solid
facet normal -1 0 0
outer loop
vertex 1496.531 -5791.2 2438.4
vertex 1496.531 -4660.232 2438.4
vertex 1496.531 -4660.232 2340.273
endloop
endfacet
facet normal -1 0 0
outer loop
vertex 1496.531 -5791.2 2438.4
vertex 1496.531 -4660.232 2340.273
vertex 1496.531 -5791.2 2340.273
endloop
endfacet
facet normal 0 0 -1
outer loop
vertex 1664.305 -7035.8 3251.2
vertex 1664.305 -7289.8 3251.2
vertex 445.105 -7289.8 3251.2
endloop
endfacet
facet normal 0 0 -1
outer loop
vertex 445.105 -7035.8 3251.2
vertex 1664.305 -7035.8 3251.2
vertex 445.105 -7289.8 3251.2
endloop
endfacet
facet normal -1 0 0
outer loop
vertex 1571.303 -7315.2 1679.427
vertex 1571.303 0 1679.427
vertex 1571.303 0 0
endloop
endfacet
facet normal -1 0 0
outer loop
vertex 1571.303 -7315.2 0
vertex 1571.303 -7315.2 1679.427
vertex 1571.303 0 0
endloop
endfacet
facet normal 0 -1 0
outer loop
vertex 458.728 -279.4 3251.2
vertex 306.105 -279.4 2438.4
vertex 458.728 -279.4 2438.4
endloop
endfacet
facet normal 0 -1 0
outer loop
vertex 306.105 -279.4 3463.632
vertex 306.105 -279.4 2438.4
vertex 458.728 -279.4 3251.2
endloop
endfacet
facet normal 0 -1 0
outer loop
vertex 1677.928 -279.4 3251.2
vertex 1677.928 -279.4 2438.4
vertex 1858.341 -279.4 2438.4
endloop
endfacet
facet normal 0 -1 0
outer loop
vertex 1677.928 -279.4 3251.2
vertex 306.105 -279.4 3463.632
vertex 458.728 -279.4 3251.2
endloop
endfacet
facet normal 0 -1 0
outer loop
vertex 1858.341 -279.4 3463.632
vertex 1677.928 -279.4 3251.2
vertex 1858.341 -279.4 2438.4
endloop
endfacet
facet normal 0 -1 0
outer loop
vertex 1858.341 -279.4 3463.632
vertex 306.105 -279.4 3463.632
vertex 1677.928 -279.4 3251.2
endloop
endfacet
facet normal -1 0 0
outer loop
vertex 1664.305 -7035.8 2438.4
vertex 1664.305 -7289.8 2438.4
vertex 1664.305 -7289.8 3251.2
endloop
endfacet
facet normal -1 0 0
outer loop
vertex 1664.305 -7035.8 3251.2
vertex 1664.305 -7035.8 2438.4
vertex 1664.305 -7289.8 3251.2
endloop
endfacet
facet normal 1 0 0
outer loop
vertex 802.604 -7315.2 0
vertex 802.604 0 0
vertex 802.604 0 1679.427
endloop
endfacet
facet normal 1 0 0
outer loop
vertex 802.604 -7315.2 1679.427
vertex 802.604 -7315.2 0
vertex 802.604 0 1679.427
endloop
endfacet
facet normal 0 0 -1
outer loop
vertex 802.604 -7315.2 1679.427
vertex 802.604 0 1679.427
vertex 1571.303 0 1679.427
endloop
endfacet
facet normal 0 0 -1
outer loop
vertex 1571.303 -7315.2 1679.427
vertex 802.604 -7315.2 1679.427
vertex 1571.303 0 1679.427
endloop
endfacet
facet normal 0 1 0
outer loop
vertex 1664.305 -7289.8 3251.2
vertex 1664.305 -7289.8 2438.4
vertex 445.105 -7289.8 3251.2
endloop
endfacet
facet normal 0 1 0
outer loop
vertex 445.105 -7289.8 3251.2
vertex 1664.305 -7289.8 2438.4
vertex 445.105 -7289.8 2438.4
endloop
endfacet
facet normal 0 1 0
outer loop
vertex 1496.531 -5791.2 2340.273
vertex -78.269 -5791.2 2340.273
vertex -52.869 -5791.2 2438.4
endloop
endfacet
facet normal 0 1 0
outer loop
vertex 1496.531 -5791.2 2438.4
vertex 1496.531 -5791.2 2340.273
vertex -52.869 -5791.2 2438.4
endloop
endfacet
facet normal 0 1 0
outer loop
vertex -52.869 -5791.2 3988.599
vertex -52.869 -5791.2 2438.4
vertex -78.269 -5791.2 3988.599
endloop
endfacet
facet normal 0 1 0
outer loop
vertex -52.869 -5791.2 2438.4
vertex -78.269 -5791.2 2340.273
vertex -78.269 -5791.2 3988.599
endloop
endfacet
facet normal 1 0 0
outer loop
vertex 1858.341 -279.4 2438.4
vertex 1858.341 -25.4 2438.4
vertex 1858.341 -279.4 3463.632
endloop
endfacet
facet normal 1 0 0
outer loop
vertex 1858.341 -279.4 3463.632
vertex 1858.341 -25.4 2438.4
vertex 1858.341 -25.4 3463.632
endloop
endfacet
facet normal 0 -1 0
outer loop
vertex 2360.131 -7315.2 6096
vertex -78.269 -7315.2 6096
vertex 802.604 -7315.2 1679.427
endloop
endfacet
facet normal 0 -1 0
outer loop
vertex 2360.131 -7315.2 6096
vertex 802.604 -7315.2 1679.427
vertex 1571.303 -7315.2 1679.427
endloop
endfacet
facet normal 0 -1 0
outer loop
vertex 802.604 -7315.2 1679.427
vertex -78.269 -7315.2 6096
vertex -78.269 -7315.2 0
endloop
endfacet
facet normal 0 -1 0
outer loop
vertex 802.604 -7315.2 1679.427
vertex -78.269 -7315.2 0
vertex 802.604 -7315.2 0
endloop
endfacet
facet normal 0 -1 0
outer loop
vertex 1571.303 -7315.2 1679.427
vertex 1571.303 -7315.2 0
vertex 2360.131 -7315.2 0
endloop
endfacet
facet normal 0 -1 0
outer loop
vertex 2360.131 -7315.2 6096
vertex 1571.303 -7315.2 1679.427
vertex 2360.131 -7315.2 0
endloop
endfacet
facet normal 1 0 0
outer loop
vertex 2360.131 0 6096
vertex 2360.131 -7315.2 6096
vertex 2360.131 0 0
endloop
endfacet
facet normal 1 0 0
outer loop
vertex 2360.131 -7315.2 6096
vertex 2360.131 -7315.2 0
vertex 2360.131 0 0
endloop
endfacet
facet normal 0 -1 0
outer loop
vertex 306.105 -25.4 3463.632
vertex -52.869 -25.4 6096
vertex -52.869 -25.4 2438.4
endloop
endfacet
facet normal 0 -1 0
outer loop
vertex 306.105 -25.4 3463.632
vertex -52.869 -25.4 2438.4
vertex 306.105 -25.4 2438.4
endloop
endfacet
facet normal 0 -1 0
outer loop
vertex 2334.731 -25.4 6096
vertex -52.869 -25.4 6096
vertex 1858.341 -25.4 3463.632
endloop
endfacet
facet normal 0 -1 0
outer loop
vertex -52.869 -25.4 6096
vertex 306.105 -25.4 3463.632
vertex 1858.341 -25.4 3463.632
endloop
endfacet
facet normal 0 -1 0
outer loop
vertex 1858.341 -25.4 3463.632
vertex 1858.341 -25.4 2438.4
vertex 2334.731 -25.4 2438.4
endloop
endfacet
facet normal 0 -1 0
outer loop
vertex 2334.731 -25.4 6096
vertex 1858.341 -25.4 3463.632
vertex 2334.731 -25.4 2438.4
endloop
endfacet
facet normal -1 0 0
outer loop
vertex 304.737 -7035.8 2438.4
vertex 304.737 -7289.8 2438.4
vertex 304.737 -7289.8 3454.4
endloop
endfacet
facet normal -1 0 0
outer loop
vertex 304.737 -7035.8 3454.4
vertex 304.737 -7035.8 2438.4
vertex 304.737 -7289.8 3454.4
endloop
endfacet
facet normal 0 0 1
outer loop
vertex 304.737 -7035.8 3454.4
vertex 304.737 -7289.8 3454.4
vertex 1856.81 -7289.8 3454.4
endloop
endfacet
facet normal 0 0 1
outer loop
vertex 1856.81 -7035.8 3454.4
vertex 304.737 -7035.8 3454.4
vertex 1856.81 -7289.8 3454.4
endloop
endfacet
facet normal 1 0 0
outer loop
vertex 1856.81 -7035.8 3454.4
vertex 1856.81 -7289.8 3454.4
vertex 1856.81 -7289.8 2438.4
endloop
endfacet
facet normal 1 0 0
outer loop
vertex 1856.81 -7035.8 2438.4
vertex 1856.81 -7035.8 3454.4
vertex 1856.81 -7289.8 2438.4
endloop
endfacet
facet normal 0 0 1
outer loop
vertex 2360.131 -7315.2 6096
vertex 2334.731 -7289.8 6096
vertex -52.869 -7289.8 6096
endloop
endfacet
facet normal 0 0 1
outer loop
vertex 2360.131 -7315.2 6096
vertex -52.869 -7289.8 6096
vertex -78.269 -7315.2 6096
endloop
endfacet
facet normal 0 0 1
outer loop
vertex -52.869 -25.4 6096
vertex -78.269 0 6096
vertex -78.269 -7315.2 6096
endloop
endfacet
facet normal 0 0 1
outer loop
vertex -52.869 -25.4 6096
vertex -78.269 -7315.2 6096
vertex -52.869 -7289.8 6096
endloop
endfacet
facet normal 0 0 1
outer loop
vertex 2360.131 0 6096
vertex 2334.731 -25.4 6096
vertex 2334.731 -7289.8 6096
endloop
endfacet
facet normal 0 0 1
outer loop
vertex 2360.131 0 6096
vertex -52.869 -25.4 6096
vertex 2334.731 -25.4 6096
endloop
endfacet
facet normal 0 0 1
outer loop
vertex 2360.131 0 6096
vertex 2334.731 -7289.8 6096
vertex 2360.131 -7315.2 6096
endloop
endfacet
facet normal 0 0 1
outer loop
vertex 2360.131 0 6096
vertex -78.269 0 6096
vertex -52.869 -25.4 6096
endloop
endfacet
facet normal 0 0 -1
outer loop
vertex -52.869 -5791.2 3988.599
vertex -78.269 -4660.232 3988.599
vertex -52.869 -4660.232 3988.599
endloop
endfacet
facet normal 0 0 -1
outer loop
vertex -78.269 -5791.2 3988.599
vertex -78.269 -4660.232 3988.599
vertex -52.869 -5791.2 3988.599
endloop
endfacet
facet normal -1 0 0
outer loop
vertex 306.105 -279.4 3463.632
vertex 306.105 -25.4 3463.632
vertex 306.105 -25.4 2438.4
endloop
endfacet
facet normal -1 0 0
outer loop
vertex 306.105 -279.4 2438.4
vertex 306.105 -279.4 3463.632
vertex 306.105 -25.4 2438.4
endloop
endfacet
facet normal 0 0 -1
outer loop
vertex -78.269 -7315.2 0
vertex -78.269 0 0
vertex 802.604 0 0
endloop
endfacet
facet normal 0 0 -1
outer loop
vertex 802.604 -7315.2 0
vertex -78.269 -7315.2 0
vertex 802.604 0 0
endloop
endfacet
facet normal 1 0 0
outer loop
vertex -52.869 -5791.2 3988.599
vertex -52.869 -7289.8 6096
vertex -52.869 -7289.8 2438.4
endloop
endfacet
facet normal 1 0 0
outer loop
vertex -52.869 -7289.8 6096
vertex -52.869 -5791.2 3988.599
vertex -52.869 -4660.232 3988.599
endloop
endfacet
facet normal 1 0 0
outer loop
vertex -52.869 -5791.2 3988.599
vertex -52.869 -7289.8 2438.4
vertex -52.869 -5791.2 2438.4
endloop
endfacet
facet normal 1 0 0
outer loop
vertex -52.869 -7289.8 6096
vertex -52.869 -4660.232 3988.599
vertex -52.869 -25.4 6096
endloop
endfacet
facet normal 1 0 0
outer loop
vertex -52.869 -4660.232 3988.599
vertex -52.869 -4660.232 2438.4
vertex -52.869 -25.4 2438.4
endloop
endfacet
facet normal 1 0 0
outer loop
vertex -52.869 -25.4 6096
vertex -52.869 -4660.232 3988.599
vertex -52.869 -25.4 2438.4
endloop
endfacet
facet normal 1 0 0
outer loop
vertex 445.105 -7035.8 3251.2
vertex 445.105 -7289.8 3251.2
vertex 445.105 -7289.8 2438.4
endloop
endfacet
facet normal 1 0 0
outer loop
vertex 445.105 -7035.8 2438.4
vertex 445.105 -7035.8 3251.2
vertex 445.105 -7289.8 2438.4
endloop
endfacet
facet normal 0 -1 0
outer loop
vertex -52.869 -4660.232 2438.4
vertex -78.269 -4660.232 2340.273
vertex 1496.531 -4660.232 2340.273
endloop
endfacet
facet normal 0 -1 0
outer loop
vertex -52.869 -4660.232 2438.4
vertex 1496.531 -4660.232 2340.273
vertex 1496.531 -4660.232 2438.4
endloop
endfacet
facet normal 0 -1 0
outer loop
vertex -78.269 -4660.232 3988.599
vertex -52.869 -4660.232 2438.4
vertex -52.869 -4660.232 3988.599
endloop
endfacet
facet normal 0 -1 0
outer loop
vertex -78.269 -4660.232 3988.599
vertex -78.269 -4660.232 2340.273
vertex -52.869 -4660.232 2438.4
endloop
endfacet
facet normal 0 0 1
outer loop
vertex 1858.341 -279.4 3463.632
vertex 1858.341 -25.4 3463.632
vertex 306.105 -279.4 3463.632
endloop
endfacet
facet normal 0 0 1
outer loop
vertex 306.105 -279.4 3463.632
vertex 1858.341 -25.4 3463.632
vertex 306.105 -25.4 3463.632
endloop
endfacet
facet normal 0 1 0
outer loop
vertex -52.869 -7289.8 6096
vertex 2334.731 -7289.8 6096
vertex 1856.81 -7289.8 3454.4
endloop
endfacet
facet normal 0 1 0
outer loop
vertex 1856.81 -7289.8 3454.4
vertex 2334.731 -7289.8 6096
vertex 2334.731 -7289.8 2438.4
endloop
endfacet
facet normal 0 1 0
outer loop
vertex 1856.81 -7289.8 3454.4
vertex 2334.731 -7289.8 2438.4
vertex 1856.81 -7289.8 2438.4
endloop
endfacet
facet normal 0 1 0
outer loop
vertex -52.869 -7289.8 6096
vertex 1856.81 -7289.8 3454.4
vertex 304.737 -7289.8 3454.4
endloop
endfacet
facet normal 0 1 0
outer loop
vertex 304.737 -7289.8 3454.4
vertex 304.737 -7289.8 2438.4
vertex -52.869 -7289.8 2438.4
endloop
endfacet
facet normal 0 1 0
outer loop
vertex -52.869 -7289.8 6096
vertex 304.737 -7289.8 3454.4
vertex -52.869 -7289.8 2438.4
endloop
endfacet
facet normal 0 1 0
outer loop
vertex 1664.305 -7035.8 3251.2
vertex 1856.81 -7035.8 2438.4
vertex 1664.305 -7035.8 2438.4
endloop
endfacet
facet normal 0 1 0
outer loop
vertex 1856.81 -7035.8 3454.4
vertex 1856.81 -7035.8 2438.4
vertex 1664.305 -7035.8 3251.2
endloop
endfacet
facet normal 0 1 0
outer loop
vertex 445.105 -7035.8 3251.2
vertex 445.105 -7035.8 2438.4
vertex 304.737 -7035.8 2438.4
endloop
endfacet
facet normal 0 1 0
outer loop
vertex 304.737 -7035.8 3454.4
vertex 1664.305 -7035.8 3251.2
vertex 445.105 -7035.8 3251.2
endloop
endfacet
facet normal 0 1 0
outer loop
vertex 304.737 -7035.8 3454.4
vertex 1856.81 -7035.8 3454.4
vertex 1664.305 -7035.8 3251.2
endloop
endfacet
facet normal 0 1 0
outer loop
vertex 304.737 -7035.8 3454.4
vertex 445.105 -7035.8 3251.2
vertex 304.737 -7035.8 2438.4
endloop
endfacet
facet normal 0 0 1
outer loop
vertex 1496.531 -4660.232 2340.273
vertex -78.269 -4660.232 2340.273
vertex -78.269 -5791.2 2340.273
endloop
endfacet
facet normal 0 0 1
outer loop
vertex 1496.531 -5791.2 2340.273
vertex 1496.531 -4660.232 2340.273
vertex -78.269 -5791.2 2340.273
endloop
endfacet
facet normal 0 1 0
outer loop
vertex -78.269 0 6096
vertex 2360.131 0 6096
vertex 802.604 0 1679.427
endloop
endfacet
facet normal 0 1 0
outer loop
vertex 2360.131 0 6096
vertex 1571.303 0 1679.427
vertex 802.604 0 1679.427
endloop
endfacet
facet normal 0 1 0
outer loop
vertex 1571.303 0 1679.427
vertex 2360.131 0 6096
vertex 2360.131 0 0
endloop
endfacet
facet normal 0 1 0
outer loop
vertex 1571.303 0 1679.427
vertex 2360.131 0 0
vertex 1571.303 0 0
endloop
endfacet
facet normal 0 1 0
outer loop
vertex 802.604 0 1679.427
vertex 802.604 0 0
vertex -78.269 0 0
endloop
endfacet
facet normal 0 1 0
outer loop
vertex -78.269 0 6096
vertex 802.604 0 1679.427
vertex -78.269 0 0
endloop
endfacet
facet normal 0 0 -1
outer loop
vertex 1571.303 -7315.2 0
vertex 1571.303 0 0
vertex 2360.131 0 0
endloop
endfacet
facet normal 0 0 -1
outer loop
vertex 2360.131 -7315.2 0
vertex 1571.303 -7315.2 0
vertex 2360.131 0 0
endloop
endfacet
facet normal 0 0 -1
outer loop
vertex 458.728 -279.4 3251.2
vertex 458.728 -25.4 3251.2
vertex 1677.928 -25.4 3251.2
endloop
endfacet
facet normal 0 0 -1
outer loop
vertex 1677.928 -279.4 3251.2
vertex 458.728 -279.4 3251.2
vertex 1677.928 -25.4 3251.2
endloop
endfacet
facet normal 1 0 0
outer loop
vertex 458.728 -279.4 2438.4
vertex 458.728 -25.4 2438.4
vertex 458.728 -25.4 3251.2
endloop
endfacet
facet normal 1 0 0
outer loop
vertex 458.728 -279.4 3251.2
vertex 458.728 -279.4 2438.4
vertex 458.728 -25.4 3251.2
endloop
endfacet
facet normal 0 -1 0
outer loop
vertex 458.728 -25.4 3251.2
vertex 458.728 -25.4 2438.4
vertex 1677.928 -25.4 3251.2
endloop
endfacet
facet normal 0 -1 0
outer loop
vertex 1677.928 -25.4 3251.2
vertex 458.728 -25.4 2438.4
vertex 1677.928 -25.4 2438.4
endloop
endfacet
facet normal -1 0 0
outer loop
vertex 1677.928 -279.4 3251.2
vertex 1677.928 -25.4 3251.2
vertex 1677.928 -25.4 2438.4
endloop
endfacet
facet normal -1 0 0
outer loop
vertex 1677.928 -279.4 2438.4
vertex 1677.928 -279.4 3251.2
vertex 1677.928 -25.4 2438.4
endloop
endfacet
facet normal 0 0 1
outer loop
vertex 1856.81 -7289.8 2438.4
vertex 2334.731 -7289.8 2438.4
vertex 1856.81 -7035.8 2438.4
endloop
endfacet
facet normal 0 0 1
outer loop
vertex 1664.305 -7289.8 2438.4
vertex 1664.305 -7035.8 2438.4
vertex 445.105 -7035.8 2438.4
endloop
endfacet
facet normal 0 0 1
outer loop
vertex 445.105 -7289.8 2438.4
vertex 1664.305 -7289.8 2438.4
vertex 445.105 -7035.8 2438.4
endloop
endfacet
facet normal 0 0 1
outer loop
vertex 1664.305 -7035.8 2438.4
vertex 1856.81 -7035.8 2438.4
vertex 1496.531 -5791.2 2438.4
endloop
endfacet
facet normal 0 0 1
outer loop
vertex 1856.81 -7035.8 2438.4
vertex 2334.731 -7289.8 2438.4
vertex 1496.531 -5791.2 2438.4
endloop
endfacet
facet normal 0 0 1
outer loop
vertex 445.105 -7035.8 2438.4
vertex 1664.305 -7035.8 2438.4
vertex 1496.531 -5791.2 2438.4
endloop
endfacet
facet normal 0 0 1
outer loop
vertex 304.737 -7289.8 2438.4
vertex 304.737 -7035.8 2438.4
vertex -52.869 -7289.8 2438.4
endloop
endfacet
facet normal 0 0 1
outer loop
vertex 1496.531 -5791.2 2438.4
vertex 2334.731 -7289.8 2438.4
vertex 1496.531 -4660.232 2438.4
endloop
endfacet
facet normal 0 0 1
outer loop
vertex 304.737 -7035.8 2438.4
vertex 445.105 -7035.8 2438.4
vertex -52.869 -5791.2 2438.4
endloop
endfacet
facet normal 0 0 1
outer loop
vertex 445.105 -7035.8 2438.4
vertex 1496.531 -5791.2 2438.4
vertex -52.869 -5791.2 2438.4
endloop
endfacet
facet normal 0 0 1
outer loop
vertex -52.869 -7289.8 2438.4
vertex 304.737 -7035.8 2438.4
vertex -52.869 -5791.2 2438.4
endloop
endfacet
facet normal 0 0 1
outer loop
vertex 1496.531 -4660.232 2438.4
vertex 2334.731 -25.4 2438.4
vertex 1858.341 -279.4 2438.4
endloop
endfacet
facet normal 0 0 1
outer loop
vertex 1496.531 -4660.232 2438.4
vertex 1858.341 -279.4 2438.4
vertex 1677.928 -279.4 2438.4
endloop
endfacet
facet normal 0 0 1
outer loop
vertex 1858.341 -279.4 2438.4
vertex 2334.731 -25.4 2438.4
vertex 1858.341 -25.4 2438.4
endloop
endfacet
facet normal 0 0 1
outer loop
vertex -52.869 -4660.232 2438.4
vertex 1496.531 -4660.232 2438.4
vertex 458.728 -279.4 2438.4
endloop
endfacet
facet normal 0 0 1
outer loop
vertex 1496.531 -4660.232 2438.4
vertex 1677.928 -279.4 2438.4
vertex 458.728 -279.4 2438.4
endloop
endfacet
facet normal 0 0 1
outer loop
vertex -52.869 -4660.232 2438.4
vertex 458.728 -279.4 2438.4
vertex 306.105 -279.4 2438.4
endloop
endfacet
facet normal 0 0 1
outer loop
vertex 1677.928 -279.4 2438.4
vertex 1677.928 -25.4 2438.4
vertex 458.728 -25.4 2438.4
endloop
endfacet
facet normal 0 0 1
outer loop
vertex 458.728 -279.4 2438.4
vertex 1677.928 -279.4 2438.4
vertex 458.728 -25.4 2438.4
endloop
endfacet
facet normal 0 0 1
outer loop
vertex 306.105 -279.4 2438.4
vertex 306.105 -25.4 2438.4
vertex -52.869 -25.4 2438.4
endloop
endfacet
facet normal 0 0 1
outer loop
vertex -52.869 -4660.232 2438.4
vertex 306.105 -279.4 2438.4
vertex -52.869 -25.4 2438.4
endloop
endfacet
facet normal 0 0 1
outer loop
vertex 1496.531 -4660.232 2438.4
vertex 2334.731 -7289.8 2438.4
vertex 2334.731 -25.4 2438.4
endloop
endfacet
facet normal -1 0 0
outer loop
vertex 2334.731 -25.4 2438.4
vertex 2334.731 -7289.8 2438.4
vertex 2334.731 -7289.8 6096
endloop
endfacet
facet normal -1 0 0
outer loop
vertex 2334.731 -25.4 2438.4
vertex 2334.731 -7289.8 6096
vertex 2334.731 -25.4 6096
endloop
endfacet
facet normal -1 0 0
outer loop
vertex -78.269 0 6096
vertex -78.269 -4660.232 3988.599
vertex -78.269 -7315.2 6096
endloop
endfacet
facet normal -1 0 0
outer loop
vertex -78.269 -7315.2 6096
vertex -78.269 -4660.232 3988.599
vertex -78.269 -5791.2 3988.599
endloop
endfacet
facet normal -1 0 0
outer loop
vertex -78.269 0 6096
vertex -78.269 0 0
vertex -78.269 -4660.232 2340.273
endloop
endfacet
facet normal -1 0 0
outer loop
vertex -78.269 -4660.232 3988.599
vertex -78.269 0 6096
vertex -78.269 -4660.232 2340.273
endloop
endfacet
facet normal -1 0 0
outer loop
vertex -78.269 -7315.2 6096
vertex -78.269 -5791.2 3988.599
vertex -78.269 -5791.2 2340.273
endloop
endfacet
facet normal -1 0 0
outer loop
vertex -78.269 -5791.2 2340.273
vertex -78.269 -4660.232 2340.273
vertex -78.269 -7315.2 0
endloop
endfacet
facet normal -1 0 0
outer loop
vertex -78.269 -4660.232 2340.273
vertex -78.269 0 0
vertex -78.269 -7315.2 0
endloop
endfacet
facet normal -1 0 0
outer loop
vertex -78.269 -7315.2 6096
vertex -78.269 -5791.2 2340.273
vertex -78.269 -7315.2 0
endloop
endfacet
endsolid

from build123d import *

# Parameters (mm, degrees)
F1_DEPTH = 7315.2
F2_W     = 25.4
F2_H     = 7264.4
F3_DEPTH = 3657.6
F4_W     = 1130.968094
F4_H     = 1648.326397
F5_DEPTH = 1574.8
F7_DEPTH = 254
F9_DEPTH = 254


with BuildPart() as f1:
    # F0 (on Front) → F1 (new body)
    with BuildSketch(Plane.XZ):
        Polygon((2360.131245, 2438.4), (-78.268755, 2438.4), (-78.268755, 0), (802.604079, 0), (802.604079, 1679.426908), (1571.302772, 1679.426908), (1571.302772, 0), (2360.131245, 0), align=None)
    extrude(amount=F1_DEPTH)

    # F2 (on face) → F3 (join)
    with BuildSketch(Plane.XY.offset(2438.4)):
        Polygon((-78.268755, -7289.8), (-78.268755, -7315.2), (2360.131245, -7315.2), (2360.131245, -7289.8), (2334.731245, -7289.8), (-52.868755, -7289.8), align=None)
        Polygon((-78.268755, 0), (-78.268755, -7289.8), (-52.868755, -7289.8), (-52.868755, -25.4), (-52.868755, 0), align=None)
        with Locations((2347.431245, -3657.6)):
            Rectangle(F2_W, F2_H)
        Polygon((2334.731245, -25.4), (2360.131245, -25.4), (2360.131245, 0), (-52.868755, 0), (-52.868755, -25.4), align=None)
    extrude(amount=F3_DEPTH)

    # F4 (on face) → F5 (cut)
    with BuildSketch(Plane(origin=(-78.268755, 0, 0), x_dir=(0, -1, 0), z_dir=(-1, 0, 0))):
        with Locations((5225.715637, 3164.436101)):
            Rectangle(F4_W, F4_H)
    extrude(amount=-F5_DEPTH, mode=Mode.SUBTRACT)

    # F6 (on face) → F7 (join)
    with BuildSketch(Plane.XZ.offset(25.4)):
        Polygon((458.727852, 2438.4), (458.727852, 3251.2), (1677.927852, 3251.2), (1677.927852, 2438.4), (1858.340859, 2438.4), (1858.340859, 3463.632425), (306.10472, 3463.632425), (306.10472, 2438.4), align=None)
    extrude(amount=F7_DEPTH)

    # F8 (on face) → F9 (join)
    with BuildSketch(Plane(origin=(0, -7289.8, 0), x_dir=(-1, 0, 0), z_dir=(0, 1, 0))):
        Polygon((-1664.304972, 2438.4), (-1664.304972, 3251.2), (-445.104972, 3251.2), (-445.104972, 2438.4), (-304.736584, 2438.4), (-304.736584, 3454.4), (-1856.810093, 3454.4), (-1856.810093, 2438.4), align=None)
    extrude(amount=F9_DEPTH)


solid = f1.part
